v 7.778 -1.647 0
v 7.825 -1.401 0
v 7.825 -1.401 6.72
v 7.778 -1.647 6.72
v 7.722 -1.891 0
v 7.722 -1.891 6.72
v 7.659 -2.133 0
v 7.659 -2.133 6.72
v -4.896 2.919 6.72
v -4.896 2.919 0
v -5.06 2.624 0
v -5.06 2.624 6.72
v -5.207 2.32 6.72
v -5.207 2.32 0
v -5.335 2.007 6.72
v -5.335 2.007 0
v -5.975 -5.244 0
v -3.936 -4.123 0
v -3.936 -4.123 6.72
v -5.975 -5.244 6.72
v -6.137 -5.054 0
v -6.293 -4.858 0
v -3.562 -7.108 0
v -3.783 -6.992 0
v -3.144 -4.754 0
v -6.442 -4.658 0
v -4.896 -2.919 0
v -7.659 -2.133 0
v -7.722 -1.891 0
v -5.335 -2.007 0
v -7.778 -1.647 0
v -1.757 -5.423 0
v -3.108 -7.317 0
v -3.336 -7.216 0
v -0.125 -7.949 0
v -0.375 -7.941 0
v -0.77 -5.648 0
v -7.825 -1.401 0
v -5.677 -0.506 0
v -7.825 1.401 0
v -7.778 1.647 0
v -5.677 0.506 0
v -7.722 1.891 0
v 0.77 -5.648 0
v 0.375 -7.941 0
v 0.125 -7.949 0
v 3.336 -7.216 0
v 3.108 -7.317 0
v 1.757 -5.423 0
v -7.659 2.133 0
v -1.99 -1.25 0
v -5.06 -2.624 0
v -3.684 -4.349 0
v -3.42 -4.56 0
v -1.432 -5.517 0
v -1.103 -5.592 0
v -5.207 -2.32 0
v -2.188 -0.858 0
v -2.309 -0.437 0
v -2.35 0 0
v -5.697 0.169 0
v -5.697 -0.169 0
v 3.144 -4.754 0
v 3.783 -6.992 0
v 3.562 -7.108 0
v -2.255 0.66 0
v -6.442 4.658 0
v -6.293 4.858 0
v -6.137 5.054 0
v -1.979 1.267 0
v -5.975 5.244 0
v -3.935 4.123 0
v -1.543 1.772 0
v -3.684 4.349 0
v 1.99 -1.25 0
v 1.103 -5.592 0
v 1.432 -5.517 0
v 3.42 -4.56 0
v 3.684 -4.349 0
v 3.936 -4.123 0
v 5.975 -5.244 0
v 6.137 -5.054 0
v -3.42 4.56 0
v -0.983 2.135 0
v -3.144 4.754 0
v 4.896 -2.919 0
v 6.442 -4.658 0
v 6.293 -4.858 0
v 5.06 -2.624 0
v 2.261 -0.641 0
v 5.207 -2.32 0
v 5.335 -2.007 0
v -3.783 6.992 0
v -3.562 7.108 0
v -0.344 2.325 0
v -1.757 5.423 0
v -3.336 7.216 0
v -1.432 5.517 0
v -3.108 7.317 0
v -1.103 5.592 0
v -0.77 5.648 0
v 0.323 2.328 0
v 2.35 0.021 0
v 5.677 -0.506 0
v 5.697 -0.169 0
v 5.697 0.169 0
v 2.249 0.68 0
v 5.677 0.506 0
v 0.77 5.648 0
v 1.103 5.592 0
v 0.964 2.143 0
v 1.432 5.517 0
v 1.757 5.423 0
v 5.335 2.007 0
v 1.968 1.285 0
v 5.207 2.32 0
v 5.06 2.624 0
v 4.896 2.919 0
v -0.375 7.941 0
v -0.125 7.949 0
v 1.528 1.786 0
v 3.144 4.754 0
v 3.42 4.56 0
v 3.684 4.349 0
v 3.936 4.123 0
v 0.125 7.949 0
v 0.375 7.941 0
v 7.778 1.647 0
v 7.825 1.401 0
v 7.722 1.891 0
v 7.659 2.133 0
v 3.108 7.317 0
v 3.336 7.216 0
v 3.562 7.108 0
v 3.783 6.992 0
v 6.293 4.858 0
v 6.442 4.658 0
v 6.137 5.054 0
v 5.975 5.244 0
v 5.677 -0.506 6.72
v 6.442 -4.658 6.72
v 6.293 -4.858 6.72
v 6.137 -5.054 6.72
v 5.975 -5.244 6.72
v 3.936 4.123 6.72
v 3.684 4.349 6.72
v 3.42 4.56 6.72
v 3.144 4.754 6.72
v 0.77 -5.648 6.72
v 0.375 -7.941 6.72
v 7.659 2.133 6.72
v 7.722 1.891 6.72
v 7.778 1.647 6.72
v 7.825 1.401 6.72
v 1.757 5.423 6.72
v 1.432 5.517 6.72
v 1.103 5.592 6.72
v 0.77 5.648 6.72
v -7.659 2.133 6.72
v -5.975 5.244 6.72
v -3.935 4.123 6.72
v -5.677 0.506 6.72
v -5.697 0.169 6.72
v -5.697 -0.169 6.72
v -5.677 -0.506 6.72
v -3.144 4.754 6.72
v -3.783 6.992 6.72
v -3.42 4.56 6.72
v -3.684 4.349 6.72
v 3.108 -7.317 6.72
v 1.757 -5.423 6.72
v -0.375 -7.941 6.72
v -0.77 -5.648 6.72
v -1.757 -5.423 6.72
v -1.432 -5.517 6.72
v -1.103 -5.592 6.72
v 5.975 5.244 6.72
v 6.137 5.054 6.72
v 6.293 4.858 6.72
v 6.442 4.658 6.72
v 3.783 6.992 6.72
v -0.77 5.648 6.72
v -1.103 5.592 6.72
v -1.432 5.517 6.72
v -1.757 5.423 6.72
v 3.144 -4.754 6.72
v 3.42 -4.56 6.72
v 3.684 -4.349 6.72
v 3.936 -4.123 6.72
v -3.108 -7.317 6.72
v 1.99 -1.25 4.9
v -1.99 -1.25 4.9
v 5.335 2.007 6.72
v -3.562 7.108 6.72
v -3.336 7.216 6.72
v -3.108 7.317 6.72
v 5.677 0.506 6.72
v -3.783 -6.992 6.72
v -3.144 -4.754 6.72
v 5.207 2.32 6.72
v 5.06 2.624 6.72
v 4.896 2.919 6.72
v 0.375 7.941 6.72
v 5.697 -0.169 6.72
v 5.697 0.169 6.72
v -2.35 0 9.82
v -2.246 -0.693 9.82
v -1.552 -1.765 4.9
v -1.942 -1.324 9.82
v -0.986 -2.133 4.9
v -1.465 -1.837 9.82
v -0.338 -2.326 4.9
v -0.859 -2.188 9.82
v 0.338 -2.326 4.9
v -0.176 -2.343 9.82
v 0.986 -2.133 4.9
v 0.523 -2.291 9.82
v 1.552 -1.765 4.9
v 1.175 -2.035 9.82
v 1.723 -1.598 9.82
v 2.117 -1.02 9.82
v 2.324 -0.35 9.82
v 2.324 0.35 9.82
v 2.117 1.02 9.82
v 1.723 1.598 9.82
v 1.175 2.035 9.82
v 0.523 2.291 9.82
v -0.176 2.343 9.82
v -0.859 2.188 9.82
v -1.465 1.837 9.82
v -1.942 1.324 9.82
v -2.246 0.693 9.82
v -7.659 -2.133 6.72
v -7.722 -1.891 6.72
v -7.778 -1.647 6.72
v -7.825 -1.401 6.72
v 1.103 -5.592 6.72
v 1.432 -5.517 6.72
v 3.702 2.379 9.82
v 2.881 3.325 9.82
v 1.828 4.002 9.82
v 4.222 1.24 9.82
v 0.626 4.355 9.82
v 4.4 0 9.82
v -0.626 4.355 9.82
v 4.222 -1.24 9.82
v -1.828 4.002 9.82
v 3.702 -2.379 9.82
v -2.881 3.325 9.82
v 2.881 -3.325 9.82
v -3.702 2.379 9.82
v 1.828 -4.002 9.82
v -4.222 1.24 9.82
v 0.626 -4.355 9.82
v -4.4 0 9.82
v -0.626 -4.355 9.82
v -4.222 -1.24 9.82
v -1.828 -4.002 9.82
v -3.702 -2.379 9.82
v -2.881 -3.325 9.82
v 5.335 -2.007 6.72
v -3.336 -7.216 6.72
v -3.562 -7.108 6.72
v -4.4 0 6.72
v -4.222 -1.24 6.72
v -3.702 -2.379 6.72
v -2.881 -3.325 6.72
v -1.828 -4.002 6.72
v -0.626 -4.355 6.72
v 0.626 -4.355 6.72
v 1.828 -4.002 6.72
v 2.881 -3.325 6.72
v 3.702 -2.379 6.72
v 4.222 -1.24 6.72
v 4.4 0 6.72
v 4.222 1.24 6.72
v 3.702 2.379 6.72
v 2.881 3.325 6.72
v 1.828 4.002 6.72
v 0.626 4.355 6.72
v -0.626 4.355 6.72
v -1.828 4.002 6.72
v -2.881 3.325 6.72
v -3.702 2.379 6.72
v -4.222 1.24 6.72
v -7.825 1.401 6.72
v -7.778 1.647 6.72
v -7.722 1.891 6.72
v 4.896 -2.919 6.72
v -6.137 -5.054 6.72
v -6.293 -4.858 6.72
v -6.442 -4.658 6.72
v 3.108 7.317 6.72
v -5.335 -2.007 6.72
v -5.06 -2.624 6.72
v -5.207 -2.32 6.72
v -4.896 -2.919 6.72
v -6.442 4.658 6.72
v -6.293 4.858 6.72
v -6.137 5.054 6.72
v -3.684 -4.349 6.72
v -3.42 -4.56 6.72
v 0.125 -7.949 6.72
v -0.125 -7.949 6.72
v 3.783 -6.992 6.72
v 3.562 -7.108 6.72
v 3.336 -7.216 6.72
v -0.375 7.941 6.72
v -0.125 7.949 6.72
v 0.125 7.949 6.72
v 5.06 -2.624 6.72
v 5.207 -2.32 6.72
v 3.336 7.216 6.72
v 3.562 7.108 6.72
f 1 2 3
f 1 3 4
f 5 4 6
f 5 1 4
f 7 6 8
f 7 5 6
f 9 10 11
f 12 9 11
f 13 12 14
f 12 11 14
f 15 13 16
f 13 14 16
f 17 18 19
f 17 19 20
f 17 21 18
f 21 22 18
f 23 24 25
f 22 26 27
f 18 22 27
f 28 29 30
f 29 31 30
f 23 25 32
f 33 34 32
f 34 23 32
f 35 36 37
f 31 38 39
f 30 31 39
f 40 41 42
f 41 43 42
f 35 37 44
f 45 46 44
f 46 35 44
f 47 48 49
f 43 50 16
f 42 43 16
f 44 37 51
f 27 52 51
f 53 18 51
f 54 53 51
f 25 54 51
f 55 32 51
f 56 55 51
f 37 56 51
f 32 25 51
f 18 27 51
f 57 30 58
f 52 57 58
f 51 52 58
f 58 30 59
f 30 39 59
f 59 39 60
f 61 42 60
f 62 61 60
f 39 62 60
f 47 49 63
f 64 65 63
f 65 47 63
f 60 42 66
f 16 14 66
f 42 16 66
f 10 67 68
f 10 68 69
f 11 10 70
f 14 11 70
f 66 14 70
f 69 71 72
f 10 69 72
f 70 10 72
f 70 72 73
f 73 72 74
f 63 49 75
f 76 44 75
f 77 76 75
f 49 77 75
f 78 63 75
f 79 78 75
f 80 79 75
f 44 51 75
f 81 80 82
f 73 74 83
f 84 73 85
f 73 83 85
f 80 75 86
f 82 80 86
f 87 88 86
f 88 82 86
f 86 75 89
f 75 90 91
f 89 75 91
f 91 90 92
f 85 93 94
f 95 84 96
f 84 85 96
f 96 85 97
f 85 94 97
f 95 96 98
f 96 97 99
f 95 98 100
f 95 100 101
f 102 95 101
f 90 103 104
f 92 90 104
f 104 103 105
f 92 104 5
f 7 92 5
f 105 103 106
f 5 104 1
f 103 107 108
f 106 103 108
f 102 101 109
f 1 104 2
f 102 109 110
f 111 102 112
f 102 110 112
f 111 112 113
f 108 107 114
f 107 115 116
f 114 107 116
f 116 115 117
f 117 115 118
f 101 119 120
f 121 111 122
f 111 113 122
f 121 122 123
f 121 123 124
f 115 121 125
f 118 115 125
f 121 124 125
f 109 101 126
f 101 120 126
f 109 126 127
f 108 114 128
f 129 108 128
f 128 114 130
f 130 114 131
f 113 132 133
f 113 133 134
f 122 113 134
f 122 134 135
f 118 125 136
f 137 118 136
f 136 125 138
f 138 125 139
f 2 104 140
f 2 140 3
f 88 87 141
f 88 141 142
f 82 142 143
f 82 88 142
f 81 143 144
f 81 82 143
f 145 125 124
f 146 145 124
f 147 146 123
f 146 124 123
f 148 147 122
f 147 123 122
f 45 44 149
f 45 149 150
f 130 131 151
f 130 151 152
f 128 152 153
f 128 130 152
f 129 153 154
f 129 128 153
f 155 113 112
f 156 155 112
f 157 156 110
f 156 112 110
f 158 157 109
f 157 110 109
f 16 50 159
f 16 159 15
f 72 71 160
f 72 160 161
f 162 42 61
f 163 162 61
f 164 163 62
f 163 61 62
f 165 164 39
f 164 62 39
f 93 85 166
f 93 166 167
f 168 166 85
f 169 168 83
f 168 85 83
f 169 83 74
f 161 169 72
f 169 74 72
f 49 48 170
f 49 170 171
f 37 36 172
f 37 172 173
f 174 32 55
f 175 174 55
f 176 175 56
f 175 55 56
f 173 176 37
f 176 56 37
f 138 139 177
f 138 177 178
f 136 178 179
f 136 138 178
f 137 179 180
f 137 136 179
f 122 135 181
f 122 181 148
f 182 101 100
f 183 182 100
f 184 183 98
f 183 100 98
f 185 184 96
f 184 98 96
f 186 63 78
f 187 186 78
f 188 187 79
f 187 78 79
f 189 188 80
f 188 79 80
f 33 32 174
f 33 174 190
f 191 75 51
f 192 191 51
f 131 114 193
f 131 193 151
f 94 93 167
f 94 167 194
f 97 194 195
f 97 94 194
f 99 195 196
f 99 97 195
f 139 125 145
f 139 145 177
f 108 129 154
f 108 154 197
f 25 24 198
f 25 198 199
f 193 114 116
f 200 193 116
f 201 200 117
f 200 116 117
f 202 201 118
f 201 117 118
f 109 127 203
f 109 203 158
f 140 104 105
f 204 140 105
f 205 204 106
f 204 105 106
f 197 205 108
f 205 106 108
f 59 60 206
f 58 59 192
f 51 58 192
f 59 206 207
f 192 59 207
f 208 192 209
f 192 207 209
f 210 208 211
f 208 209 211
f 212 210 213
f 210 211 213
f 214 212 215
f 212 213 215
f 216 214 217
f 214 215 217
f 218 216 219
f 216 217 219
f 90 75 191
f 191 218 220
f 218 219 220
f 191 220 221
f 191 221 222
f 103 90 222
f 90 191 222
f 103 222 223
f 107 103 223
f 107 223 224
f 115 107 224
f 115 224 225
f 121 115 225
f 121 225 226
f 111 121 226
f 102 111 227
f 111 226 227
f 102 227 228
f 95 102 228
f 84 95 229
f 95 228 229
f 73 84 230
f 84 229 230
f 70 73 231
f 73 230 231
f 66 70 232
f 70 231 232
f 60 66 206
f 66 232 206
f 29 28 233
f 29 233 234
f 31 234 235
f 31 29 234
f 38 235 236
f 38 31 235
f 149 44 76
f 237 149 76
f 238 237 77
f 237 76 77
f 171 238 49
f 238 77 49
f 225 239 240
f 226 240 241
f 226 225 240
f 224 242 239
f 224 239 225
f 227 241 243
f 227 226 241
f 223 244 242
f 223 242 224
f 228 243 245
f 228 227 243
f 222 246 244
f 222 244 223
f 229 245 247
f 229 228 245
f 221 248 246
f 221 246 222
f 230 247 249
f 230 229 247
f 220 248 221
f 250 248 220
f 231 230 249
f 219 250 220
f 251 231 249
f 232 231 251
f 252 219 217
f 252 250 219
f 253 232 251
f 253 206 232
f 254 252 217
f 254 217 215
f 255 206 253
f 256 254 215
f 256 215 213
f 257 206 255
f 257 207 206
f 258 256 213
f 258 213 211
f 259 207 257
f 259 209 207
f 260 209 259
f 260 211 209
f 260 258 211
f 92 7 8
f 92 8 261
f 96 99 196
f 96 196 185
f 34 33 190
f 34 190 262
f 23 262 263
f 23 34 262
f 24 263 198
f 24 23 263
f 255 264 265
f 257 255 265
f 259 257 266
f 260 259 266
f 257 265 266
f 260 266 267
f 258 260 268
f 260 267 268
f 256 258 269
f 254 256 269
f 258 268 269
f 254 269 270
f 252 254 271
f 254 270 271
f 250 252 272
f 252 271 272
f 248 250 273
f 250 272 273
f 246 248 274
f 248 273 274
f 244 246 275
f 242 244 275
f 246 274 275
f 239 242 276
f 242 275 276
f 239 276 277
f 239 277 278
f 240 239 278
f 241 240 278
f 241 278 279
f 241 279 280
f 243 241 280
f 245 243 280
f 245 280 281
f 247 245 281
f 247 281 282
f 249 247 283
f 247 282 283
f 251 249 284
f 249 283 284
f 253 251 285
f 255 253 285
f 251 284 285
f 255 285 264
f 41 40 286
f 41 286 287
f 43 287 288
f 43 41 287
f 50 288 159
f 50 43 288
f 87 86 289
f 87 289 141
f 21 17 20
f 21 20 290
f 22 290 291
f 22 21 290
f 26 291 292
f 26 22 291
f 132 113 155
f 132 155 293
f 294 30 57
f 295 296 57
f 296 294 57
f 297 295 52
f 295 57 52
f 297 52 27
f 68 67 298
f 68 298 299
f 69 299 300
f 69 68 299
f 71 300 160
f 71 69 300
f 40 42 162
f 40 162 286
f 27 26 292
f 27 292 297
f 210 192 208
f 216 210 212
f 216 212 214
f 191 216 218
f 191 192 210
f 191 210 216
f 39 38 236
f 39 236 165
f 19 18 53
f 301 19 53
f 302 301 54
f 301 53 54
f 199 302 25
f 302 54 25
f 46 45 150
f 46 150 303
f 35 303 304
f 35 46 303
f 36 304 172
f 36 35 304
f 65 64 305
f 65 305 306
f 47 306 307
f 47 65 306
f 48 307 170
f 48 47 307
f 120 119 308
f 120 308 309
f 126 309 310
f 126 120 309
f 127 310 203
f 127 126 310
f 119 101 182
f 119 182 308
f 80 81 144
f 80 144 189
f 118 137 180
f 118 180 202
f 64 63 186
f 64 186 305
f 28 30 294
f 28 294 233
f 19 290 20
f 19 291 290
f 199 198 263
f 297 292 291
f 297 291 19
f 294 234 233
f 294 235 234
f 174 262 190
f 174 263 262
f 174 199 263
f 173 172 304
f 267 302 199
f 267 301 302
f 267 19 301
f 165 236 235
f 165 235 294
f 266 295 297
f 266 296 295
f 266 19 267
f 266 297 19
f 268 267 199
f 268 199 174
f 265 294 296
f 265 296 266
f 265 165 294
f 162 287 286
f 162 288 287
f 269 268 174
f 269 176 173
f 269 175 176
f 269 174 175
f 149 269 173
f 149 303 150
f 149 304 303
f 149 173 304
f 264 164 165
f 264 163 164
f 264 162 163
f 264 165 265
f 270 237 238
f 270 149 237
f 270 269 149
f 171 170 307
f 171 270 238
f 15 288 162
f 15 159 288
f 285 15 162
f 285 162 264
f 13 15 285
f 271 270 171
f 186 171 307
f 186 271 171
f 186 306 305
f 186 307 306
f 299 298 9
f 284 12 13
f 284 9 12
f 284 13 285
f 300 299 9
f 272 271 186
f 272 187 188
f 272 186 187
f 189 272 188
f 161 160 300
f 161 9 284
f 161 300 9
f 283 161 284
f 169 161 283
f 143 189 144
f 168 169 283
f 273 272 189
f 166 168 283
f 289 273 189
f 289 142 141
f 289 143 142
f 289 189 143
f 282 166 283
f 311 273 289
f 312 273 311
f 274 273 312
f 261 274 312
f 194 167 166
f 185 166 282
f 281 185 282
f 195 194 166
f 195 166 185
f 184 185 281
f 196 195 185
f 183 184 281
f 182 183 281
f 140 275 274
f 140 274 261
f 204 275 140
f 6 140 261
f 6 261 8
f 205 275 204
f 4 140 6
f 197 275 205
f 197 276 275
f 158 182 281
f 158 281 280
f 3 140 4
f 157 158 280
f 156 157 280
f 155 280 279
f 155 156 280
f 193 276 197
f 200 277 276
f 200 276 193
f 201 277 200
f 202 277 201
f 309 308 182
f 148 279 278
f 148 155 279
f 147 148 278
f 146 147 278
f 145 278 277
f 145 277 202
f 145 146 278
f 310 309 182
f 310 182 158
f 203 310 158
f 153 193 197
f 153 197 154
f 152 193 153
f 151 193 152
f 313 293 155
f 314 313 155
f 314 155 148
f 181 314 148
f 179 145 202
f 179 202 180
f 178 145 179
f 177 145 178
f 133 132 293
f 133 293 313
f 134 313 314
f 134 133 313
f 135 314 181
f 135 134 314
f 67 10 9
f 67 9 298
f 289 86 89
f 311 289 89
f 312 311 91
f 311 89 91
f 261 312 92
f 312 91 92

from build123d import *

# Parameters (mm, degrees)
SKETCH1_R              = 5.7
MOTOR_GEAR_SHAPE_DEPTH = 6.72
MOTOR_START            = -6.72
MOTOR_GEAR_TOOTH_DEPTH = 6.72
MOTOR_GEAR_TEETH_COUNT = 14
MOTOR_GEAR_TEETH_ANGLE = 334.28577
SKETCH3_R              = 4.4
SKETCH3_R_2            = 2.35
MOTOR_GEAR_BOSS_DEPTH  = 3.1
SKETCH4_R              = 2.35
MOTOR_SHAFT_HOLE_DEPTH = 15.861806289
MOTOR_SHAFT_FLAT_DEPTH = 4.9


with BuildPart() as part:
    # Sketch1 → motor gear shape (new body)
    with BuildSketch(Plane.XY):
        Circle(SKETCH1_R)
    extrude(amount=MOTOR_GEAR_SHAPE_DEPTH)

    # Sketch2 → motor gear tooth (add)
    with BuildSketch(Plane.XY.offset(6.72).offset(MOTOR_START)):
        with BuildLine():
            Line((0.375, 7.941150735), (0.77, 5.647751765))
            ThreePointArc((0.77, 5.647751765), (0, 5.7), (-0.77, 5.647751765))
            Line((-0.77, 5.647751765), (-0.375, 7.941150735))
            ThreePointArc((-0.375, 7.941150735), (0, 7.95), (0.375, 7.941150735))
        make_face()
    motor_gear_tooth = extrude(amount=MOTOR_GEAR_TOOTH_DEPTH)

    # motor gear teeth: motor gear tooth ×14 about axis
    motor_gear_teeth_axis = Axis((0, 0, 0), (0, 0, -1))
    for i in range(1, MOTOR_GEAR_TEETH_COUNT):
        add(motor_gear_tooth.rotate(motor_gear_teeth_axis, i * MOTOR_GEAR_TEETH_ANGLE / (MOTOR_GEAR_TEETH_COUNT - 1)))

    # Sketch3 → motor gear boss (add)
    with BuildSketch(Plane.XY.offset(6.72)):
        with Locations(Location((0, 0, 0), (0, 0, 180))):
            Circle(SKETCH3_R)
        with Locations(Location((0, 0, 0), (0, 0, 180))):
            Circle(SKETCH3_R_2, mode=Mode.SUBTRACT)
    extrude(amount=MOTOR_GEAR_BOSS_DEPTH)

    # Sketch4 → motor shaft hole (cut, through all)
    with BuildSketch(Plane.XY.offset(9.82)):
        with Locations(Location((0, 0, 0), (0, 0, 180))):
            Circle(SKETCH4_R)
    extrude(amount=-MOTOR_SHAFT_HOLE_DEPTH, mode=Mode.SUBTRACT)

    # Sketch5 → motor shaft flat (add)
    with BuildSketch(Plane(origin=(0, 0, 0), x_dir=(-1, 0, 0), z_dir=(0, 0, -1))):
        with BuildLine():
            Line((-3.108054054, -1.25), (3.108054054, -1.25))
            ThreePointArc((3.108054054, -1.25), (0, -3.35), (-3.108054054, -1.25))
        make_face()
    extrude(amount=-MOTOR_SHAFT_FLAT_DEPTH)


solid = part.part
